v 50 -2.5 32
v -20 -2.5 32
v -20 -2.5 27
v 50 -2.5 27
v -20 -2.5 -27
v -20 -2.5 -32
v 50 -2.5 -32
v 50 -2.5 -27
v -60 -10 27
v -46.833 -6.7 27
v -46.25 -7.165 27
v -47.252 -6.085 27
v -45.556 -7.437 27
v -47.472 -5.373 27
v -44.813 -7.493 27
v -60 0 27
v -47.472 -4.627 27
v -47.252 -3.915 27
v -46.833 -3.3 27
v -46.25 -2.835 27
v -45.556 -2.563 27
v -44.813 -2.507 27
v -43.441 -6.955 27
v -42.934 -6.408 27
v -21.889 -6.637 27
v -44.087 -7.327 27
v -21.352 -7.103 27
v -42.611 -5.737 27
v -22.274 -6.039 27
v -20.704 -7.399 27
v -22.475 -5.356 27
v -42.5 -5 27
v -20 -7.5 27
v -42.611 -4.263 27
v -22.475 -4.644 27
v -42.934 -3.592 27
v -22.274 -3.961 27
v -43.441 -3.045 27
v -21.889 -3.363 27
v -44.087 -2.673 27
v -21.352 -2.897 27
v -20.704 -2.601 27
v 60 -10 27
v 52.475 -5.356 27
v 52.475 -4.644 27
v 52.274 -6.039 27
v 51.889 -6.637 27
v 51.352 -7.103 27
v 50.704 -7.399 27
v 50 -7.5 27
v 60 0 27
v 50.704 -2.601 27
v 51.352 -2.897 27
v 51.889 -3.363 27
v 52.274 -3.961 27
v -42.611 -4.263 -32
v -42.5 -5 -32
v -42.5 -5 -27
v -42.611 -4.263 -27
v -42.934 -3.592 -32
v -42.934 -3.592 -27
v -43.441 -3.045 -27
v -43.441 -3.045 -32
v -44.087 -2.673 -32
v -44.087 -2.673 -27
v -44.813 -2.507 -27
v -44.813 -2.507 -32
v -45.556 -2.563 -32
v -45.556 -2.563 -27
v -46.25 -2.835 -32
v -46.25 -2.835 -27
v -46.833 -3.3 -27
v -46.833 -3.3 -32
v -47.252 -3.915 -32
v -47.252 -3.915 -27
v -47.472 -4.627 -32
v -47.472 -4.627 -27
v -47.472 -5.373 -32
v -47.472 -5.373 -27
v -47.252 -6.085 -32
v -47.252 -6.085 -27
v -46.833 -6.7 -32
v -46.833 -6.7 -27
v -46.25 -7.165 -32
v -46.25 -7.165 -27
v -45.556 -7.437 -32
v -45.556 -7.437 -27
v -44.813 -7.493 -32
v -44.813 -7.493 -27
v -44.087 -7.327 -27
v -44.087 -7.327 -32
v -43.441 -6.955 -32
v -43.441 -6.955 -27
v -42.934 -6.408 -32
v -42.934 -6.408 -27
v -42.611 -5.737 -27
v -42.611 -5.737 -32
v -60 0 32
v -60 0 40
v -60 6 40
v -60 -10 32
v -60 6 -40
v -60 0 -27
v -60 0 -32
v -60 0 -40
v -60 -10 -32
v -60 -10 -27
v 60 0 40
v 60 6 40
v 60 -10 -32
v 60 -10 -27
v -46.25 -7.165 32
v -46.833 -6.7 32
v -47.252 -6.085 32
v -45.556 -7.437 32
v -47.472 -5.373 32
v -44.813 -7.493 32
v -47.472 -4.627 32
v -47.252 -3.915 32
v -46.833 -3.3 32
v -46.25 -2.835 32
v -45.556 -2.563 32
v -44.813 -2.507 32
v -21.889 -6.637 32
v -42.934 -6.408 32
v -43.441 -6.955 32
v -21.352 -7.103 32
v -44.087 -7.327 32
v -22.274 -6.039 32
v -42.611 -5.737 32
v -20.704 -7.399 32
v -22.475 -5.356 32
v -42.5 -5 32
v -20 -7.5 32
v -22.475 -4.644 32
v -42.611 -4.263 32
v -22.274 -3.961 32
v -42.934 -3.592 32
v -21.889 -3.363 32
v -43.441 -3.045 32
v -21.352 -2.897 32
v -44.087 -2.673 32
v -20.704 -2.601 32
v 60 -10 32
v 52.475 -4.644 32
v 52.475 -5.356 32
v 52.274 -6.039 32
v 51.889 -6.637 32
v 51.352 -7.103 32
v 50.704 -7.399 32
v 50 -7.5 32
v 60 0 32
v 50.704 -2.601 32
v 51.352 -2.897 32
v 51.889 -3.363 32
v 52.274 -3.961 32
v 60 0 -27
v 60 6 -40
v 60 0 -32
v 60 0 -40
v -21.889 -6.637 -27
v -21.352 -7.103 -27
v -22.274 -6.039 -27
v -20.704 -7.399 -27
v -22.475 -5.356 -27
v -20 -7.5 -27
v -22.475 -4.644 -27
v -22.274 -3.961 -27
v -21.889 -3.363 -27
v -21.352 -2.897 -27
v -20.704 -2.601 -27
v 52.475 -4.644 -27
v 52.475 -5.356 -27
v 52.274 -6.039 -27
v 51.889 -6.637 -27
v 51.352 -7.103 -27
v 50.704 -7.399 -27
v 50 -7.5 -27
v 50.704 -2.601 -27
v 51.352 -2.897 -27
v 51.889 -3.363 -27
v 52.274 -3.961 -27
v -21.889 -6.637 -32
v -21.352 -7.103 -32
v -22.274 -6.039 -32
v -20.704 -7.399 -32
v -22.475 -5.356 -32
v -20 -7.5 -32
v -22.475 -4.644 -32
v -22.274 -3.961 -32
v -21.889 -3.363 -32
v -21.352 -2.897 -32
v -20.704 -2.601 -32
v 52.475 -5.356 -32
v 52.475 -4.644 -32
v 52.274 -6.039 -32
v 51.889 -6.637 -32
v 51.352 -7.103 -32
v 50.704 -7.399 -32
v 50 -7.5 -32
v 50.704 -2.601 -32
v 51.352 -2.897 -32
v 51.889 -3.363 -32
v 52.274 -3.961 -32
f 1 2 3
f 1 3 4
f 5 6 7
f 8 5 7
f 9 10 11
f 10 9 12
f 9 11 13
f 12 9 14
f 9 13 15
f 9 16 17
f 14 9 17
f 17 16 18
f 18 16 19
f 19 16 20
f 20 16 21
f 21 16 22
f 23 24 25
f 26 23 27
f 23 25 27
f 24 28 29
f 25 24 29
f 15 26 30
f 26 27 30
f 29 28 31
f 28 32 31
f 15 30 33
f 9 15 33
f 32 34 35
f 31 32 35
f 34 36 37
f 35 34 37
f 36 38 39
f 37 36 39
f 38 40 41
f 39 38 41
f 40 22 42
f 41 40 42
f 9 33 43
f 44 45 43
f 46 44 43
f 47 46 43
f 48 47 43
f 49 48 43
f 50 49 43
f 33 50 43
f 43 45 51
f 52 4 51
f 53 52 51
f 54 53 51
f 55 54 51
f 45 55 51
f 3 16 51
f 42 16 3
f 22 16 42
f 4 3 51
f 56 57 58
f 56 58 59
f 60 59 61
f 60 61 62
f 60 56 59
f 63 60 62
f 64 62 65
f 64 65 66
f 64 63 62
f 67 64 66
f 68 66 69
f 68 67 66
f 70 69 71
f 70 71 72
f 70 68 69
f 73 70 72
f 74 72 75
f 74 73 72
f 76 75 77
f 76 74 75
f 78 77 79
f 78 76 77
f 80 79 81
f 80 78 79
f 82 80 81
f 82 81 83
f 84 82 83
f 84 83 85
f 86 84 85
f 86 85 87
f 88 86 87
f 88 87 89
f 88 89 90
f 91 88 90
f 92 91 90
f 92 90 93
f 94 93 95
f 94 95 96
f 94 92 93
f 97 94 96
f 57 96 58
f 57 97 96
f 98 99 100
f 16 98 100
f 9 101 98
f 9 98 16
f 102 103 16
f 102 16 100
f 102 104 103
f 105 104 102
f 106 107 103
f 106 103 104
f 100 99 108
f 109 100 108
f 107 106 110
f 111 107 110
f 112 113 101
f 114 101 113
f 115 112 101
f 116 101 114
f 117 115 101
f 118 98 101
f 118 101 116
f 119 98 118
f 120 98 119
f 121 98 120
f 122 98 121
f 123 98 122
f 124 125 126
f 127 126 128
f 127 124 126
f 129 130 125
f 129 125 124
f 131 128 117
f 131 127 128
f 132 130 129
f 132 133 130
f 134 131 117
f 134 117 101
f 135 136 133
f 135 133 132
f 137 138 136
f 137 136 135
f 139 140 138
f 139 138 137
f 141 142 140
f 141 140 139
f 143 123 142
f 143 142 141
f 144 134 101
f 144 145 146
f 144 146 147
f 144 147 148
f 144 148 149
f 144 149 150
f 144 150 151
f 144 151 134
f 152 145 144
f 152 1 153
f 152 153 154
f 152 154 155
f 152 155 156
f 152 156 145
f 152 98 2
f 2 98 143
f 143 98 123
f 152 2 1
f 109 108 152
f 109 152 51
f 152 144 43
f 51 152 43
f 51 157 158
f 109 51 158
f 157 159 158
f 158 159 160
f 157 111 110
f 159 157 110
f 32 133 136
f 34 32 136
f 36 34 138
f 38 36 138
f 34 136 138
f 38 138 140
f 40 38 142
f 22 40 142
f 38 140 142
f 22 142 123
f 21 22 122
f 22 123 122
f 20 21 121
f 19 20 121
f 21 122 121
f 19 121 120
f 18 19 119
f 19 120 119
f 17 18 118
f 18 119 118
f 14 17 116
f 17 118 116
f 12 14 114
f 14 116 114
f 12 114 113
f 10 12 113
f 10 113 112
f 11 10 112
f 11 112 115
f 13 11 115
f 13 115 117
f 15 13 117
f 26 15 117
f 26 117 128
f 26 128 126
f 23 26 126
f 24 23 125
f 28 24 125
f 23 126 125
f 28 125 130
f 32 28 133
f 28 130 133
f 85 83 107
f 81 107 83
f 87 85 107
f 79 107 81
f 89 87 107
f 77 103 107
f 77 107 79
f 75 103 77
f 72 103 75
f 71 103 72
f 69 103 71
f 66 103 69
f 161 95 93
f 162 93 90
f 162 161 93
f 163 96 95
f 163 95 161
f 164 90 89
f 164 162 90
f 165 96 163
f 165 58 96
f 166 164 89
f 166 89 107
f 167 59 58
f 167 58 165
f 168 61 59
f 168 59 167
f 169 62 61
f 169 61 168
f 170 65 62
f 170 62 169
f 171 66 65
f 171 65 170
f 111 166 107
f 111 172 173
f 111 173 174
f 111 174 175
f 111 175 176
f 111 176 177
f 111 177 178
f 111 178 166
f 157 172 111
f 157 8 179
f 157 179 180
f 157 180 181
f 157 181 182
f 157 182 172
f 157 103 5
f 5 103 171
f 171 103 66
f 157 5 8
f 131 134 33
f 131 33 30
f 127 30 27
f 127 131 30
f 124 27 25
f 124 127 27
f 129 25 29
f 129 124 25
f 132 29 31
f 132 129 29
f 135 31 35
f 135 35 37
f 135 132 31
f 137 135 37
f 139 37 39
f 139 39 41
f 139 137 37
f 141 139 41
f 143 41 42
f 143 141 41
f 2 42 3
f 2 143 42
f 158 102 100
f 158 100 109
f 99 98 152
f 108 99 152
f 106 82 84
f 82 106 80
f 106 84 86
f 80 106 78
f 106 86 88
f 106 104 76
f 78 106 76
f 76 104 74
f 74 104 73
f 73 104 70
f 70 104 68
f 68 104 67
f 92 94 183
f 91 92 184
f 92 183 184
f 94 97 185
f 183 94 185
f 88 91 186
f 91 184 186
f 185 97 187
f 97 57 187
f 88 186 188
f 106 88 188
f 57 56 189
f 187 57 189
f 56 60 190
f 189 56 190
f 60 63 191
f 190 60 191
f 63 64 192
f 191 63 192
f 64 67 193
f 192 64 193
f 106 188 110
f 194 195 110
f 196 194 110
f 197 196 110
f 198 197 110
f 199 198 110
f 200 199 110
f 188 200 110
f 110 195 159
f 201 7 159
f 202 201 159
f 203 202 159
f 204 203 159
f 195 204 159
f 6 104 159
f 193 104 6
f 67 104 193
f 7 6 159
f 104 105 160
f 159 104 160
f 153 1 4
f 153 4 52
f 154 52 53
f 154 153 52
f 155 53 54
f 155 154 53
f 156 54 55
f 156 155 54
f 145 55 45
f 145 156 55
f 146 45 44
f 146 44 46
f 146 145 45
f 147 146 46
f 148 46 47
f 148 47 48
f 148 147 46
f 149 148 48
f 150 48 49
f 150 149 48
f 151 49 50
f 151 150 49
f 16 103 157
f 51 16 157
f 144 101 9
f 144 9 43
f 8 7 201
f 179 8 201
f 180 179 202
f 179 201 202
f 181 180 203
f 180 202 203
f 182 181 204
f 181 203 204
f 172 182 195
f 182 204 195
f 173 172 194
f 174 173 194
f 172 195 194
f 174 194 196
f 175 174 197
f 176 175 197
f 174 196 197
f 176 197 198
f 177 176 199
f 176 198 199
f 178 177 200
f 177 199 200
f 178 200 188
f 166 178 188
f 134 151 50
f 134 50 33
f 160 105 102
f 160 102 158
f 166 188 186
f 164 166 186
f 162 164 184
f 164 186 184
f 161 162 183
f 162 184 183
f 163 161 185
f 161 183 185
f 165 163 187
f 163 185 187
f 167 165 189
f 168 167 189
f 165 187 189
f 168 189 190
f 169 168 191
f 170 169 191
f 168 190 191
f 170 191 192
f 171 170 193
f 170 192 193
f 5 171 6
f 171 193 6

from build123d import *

# Parameters (mm, degrees)
SKETCH_1_W          = 120
SKETCH_1_H          = 80
EXTRUDE_1_DEPTH     = 6
SKETCH_10_W         = 120
SKETCH_10_H         = 5
EXTRUDE_3_DEPTH     = 10
SKETCH_11_R         = 2.5
CUT_EXTRUDE_1_DEPTH = 5


with BuildPart() as part:
    # 草圖1 → 填料-伸長1 (new body)
    with BuildSketch(Plane(origin=(0, 0, 0), x_dir=(1, 0, 0), z_dir=(0, 1, 0))):
        Rectangle(SKETCH_1_W, SKETCH_1_H)
    extrude(amount=EXTRUDE_1_DEPTH)

    # 草圖10 → 填料-伸長3 (add)
    with BuildSketch(Plane.XZ):
        with Locations((0, 29.5)):
            Rectangle(SKETCH_10_W, SKETCH_10_H)
    extrude_3 = extrude(amount=EXTRUDE_3_DEPTH)

    # 草圖11 → 除料-伸長1 (cut)
    with BuildSketch(Plane.XY.offset(32)):
        with Locations((-45, -5)):
            Circle(SKETCH_11_R)
        with BuildLine():
            Line((-20, -2.5), (50, -2.5))
            ThreePointArc((50, -2.5), (52.5, -5), (50, -7.5))
            Line((50, -7.5), (-20, -7.5))
            ThreePointArc((-20, -7.5), (-22.5, -5), (-20, -2.5))
        make_face()
    cut_extrude_1 = extrude(amount=-CUT_EXTRUDE_1_DEPTH, mode=Mode.SUBTRACT)

    # 鏡射3: 填料-伸長3, 除料-伸長1 across plane
    add(extrude_3.mirror(Plane.XY))
    add(cut_extrude_1.mirror(Plane.XY), mode=Mode.SUBTRACT)


solid = part.part
